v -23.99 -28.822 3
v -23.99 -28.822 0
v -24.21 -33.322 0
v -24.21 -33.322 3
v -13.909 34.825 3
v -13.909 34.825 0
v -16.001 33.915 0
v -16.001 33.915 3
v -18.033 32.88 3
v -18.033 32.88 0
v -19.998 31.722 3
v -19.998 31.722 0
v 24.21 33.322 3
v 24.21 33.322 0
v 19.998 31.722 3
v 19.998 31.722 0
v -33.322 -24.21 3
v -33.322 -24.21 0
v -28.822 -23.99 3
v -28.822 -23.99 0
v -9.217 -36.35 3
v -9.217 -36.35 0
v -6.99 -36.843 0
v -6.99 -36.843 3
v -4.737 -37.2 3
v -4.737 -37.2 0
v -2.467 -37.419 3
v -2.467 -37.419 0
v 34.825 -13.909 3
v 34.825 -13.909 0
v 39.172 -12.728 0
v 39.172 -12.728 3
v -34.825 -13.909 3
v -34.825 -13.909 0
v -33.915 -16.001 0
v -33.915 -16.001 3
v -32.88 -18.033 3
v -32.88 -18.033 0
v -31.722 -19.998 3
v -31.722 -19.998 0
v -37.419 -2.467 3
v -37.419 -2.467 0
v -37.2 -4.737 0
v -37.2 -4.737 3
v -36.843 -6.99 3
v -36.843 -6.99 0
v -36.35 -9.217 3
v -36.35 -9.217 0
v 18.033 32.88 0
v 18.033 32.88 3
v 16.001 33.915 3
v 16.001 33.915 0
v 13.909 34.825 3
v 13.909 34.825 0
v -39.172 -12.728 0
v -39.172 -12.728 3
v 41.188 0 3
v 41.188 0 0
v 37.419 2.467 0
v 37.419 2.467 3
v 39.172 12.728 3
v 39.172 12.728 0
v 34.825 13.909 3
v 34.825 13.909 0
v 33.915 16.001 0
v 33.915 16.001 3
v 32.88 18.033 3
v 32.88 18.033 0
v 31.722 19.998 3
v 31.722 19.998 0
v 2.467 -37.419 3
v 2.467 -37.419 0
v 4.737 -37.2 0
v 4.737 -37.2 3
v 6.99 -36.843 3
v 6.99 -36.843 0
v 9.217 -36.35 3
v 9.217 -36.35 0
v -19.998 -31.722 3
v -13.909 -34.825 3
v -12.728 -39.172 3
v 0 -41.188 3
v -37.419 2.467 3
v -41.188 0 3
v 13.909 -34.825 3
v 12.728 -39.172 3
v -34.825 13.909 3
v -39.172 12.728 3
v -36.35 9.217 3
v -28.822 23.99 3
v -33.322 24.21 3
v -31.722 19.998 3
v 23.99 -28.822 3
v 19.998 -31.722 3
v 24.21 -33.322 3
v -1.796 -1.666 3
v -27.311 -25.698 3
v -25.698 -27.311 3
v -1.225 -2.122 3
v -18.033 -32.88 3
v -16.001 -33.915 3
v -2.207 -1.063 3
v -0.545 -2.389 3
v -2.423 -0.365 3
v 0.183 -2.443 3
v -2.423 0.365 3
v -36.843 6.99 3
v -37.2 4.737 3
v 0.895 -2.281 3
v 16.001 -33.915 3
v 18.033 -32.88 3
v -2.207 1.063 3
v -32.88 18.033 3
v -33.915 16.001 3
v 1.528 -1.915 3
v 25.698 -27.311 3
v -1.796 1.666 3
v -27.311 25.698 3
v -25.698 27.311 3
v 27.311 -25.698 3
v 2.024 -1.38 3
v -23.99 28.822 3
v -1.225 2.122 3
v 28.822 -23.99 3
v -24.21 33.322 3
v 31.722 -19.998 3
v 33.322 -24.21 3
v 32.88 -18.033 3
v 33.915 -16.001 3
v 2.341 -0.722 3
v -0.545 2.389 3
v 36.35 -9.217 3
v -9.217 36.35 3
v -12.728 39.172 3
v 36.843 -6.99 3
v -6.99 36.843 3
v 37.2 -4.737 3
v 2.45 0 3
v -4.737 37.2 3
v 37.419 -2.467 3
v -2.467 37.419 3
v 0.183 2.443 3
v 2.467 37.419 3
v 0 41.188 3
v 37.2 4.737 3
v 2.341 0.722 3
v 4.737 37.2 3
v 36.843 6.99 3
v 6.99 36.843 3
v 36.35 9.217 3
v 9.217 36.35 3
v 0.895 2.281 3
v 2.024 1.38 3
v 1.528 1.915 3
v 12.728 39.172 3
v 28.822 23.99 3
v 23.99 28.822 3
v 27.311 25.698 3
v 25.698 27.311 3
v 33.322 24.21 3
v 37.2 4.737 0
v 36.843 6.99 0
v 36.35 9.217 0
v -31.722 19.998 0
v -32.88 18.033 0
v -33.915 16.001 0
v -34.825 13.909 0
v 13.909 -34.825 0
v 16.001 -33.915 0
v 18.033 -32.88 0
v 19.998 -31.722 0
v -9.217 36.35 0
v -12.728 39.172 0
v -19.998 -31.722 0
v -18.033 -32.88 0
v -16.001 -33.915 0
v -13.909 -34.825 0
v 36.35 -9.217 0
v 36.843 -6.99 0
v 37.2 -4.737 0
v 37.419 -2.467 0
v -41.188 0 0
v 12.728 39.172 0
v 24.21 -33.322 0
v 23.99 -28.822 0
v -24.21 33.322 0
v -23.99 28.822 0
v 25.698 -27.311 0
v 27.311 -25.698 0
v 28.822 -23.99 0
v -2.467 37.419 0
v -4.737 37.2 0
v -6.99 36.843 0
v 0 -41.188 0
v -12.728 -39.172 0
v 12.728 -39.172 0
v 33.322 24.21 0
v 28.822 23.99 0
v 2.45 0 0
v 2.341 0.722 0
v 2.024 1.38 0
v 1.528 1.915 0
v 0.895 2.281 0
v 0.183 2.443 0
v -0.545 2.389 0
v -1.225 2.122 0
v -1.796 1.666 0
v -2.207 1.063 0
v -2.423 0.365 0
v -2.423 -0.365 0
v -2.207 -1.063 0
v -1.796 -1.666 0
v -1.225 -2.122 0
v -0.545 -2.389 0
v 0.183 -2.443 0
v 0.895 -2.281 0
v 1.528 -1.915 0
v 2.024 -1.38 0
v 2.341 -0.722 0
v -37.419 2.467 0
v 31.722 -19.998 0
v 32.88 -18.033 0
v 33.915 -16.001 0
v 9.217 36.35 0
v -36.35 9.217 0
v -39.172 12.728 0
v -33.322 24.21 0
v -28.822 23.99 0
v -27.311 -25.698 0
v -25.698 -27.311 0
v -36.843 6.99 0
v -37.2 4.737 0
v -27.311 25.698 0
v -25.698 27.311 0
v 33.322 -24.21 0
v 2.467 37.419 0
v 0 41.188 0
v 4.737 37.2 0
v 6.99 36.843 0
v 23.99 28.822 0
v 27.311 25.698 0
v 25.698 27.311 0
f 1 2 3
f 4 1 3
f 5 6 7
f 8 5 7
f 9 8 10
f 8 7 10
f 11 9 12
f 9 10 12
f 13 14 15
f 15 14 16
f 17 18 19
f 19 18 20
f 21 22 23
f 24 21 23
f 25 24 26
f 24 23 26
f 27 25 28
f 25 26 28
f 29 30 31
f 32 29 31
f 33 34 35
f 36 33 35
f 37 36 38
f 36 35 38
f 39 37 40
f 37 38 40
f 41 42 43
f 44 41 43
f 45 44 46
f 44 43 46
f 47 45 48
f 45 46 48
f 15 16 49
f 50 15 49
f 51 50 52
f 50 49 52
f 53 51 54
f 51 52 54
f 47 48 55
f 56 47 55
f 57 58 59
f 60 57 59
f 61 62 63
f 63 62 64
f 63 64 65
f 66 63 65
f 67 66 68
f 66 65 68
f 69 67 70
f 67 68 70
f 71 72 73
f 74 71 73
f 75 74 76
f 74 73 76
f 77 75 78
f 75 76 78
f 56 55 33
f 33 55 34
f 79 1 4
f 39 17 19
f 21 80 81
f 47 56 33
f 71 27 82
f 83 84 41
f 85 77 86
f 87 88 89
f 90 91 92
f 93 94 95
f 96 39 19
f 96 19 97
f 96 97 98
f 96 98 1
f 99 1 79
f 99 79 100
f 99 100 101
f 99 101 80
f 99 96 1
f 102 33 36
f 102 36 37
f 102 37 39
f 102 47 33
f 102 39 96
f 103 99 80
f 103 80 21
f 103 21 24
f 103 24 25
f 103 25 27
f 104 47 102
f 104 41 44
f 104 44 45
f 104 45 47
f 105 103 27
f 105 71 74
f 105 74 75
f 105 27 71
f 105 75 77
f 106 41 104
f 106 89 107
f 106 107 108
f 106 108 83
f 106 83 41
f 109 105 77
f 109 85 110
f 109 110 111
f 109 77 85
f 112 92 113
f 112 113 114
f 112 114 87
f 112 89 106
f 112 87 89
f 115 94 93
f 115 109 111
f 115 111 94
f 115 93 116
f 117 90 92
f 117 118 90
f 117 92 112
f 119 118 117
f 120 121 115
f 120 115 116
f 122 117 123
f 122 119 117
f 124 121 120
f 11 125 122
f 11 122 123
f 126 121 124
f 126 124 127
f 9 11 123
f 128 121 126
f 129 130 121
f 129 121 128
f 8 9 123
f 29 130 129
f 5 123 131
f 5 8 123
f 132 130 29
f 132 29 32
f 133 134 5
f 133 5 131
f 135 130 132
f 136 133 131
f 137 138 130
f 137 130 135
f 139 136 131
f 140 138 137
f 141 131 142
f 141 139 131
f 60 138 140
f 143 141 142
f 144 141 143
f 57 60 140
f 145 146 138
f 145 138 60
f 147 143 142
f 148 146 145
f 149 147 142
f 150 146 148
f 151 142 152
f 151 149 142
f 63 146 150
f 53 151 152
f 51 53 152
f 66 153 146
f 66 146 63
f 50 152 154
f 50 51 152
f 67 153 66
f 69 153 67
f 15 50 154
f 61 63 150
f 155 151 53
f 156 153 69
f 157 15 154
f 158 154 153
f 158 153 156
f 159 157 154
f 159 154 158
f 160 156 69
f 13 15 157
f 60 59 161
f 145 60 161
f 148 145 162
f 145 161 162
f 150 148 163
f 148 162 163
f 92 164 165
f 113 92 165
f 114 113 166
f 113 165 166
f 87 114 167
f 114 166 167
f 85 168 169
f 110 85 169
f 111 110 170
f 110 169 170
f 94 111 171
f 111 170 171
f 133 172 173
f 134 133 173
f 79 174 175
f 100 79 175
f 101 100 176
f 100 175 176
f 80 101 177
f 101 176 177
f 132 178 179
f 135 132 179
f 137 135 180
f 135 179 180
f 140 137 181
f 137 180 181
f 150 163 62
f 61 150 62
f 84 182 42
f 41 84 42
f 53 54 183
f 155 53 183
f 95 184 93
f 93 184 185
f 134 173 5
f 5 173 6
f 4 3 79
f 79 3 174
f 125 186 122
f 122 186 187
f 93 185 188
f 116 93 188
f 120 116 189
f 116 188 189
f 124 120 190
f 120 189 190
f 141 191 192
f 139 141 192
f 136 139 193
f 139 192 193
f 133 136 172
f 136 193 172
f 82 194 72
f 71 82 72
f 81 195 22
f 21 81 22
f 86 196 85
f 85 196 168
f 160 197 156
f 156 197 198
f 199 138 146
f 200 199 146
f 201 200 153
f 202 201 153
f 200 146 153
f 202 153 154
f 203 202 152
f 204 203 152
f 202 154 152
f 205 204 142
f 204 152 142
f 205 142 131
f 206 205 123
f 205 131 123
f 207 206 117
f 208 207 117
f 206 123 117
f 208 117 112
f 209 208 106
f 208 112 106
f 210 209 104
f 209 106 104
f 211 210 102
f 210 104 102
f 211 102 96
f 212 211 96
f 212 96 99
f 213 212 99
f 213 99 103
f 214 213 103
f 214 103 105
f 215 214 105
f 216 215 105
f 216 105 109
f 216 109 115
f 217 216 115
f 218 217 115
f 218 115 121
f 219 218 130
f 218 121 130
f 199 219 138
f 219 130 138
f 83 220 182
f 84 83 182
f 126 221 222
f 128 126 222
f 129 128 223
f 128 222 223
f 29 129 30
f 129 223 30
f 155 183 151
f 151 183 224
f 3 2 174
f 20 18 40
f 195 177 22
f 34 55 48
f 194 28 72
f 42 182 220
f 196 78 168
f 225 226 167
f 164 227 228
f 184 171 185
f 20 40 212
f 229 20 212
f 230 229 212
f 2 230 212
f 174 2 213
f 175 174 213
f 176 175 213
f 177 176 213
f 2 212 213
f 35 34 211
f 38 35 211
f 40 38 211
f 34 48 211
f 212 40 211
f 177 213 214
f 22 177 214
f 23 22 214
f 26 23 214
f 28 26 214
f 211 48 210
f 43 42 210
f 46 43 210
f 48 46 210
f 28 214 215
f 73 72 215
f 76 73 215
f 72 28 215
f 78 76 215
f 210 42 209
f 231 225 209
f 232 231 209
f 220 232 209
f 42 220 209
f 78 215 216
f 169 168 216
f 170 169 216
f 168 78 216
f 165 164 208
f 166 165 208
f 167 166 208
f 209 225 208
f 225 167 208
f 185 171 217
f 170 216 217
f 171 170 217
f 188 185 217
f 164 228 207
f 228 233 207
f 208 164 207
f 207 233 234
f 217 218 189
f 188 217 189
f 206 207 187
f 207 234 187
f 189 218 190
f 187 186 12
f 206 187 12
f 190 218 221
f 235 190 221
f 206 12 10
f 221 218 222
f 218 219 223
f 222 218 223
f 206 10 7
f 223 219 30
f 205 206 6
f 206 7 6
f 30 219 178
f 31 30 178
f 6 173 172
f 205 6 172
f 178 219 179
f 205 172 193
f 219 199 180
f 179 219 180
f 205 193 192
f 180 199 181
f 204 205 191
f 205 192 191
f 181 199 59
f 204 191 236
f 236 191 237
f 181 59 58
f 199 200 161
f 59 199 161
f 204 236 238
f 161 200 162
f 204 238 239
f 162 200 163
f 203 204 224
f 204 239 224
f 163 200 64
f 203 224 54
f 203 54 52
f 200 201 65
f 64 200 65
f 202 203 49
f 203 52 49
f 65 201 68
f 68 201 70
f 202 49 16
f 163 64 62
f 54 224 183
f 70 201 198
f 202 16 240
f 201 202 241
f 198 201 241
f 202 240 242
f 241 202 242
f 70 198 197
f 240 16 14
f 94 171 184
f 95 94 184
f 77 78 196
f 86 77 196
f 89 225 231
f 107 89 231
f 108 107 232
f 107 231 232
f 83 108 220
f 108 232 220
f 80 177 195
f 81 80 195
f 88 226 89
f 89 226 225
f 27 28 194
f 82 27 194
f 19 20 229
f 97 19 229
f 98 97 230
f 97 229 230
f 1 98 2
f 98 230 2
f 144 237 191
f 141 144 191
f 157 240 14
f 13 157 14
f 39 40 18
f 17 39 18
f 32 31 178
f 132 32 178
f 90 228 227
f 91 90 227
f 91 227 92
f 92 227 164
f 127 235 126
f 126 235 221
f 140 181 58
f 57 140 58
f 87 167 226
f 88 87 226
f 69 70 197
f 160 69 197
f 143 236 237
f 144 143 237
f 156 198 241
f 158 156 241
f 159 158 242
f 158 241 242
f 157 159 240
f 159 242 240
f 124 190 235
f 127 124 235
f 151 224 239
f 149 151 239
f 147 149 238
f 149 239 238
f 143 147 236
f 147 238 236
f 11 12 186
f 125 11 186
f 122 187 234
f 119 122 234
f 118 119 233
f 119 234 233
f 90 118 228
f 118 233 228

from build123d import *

# Parameters (mm, degrees)
F1_DEPTH = 3
F2_R     = 2.45
F3_DEPTH = 3


with BuildPart() as f1:
    # F0 (on Top) → F1 (new body)
    with BuildSketch(Plane.XY):
        with BuildLine():
            ThreePointArc((37.418773, -2.466863), (37.479688, -1.2341), (37.5, 0))
            ThreePointArc((37.5, 0), (37.479688, 1.2341), (37.418773, 2.466863))
            ThreePointArc((37.418773, 2.466863), (37.038313, 5.866292), (36.349671, 9.21691))
            ThreePointArc((36.349671, 9.21691), (35.664619, 11.588137), (34.825065, 13.909163))
            ThreePointArc((34.825065, 13.909163), (33.412745, 17.024644), (31.722409, 19.998469))
            ThreePointArc((31.722409, 19.998469), (30.338137, 22.041947), (28.822438, 23.989937))
            ThreePointArc((28.822438, 23.989937), (26.516504, 26.516504), (23.989937, 28.822438))
            ThreePointArc((23.989937, 28.822438), (22.041947, 30.338137), (19.998469, 31.722409))
            ThreePointArc((19.998469, 31.722409), (17.024644, 33.412745), (13.909163, 34.825065))
            ThreePointArc((13.909163, 34.825065), (11.588137, 35.664619), (9.21691, 36.349671))
            ThreePointArc((9.21691, 36.349671), (5.866292, 37.038313), (2.466863, 37.418773))
            ThreePointArc((2.466863, 37.418773), (0, 37.5), (-2.466863, 37.418773))
            ThreePointArc((-2.466863, 37.418773), (-5.866292, 37.038313), (-9.21691, 36.349671))
            ThreePointArc((-9.21691, 36.349671), (-11.588137, 35.664619), (-13.909163, 34.825065))
            ThreePointArc((-13.909163, 34.825065), (-17.024644, 33.412745), (-19.998469, 31.722409))
            ThreePointArc((-19.998469, 31.722409), (-22.041947, 30.338137), (-23.989937, 28.822438))
            ThreePointArc((-23.989937, 28.822438), (-26.516504, 26.516504), (-28.822438, 23.989937))
            ThreePointArc((-28.822438, 23.989937), (-30.338137, 22.041947), (-31.722409, 19.998469))
            ThreePointArc((-31.722409, 19.998469), (-33.412745, 17.024644), (-34.825065, 13.909163))
            ThreePointArc((-34.825065, 13.909163), (-35.664619, 11.588137), (-36.349671, 9.21691))
            ThreePointArc((-36.349671, 9.21691), (-37.038313, 5.866292), (-37.418773, 2.466863))
            ThreePointArc((-37.418773, 2.466863), (-37.5, 0), (-37.418773, -2.466863))
            ThreePointArc((-37.418773, -2.466863), (-37.038313, -5.866292), (-36.349671, -9.21691))
            ThreePointArc((-36.349671, -9.21691), (-35.664619, -11.588137), (-34.825065, -13.909163))
            ThreePointArc((-34.825065, -13.909163), (-33.412745, -17.024644), (-31.722409, -19.998469))
            ThreePointArc((-31.722409, -19.998469), (-30.338137, -22.041947), (-28.822438, -23.989937))
            ThreePointArc((-28.822438, -23.989937), (-26.516504, -26.516504), (-23.989937, -28.822438))
            ThreePointArc((-23.989937, -28.822438), (-22.041947, -30.338137), (-19.998469, -31.722409))
            ThreePointArc((-19.998469, -31.722409), (-17.024644, -33.412745), (-13.909163, -34.825065))
            ThreePointArc((-13.909163, -34.825065), (-11.588137, -35.664619), (-9.21691, -36.349671))
            ThreePointArc((-9.21691, -36.349671), (-5.866292, -37.038313), (-2.466863, -37.418773))
            ThreePointArc((-2.466863, -37.418773), (0, -37.5), (2.466863, -37.418773))
            ThreePointArc((2.466863, -37.418773), (5.866292, -37.038313), (9.21691, -36.349671))
            ThreePointArc((9.21691, -36.349671), (11.588137, -35.664619), (13.909163, -34.825065))
            ThreePointArc((13.909163, -34.825065), (17.024644, -33.412745), (19.998469, -31.722409))
            ThreePointArc((19.998469, -31.722409), (22.041947, -30.338137), (23.989937, -28.822438))
            ThreePointArc((23.989937, -28.822438), (26.516504, -26.516504), (28.822438, -23.989937))
            ThreePointArc((28.822438, -23.989937), (30.338137, -22.041947), (31.722409, -19.998469))
            ThreePointArc((31.722409, -19.998469), (33.412745, -17.024644), (34.825065, -13.909163))
            ThreePointArc((34.825065, -13.909163), (35.664619, -11.588137), (36.349671, -9.21691))
            ThreePointArc((36.349671, -9.21691), (37.038313, -5.866292), (37.418773, -2.466863))
        make_face()
        with BuildLine():
            ThreePointArc((37.418773, 2.466863), (37.479688, 1.2341), (37.5, 0))
            ThreePointArc((37.5, 0), (37.479688, -1.2341), (37.418773, -2.466863))
            Line((37.418773, -2.466863), (41.188397, 0))
            Line((41.188397, 0), (37.418773, 2.466863))
        make_face()
        with BuildLine():
            ThreePointArc((34.825065, 13.909163), (35.664619, 11.588137), (36.349671, 9.21691))
            Line((36.349671, 9.21691), (39.172493, 12.727915))
            Line((39.172493, 12.727915), (34.825065, 13.909163))
        make_face()
        with BuildLine():
            Line((39.172493, -12.727915), (36.349671, -9.21691))
            ThreePointArc((36.349671, -9.21691), (35.664619, -11.588137), (34.825065, -13.909163))
            Line((34.825065, -13.909163), (39.172493, -12.727915))
        make_face()
        with BuildLine():
            ThreePointArc((28.822438, 23.989937), (30.338137, 22.041947), (31.722409, 19.998469))
            Line((31.722409, 19.998469), (33.322113, 24.209932))
            Line((33.322113, 24.209932), (28.822438, 23.989937))
        make_face()
        with BuildLine():
            Line((33.322113, -24.209932), (31.722409, -19.998469))
            ThreePointArc((31.722409, -19.998469), (30.338137, -22.041947), (28.822438, -23.989937))
            Line((28.822438, -23.989937), (33.322113, -24.209932))
        make_face()
        with BuildLine():
            ThreePointArc((19.998469, 31.722409), (22.041947, 30.338137), (23.989937, 28.822438))
            Line((23.989937, 28.822438), (24.209932, 33.322113))
            Line((24.209932, 33.322113), (19.998469, 31.722409))
        make_face()
        with BuildLine():
            Line((24.209932, -33.322113), (23.989937, -28.822438))
            ThreePointArc((23.989937, -28.822438), (22.041947, -30.338137), (19.998469, -31.722409))
            Line((19.998469, -31.722409), (24.209932, -33.322113))
        make_face()
        with BuildLine():
            ThreePointArc((9.21691, 36.349671), (11.588137, 35.664619), (13.909163, 34.825065))
            Line((13.909163, 34.825065), (12.727915, 39.172493))
            Line((12.727915, 39.172493), (9.21691, 36.349671))
        make_face()
        with BuildLine():
            Line((12.727915, -39.172493), (13.909163, -34.825065))
            ThreePointArc((13.909163, -34.825065), (11.588137, -35.664619), (9.21691, -36.349671))
            Line((9.21691, -36.349671), (12.727915, -39.172493))
        make_face()
        with BuildLine():
            ThreePointArc((-2.466863, 37.418773), (0, 37.5), (2.466863, 37.418773))
            Line((2.466863, 37.418773), (0, 41.188397))
            Line((0, 41.188397), (-2.466863, 37.418773))
        make_face()
        with BuildLine():
            Line((0, -41.188397), (2.466863, -37.418773))
            ThreePointArc((2.466863, -37.418773), (0, -37.5), (-2.466863, -37.418773))
            Line((-2.466863, -37.418773), (0, -41.188397))
        make_face()
        with BuildLine():
            ThreePointArc((-13.909163, 34.825065), (-11.588137, 35.664619), (-9.21691, 36.349671))
            Line((-9.21691, 36.349671), (-12.727915, 39.172493))
            Line((-12.727915, 39.172493), (-13.909163, 34.825065))
        make_face()
        with BuildLine():
            Line((-12.727915, -39.172493), (-9.21691, -36.349671))
            ThreePointArc((-9.21691, -36.349671), (-11.588137, -35.664619), (-13.909163, -34.825065))
            Line((-13.909163, -34.825065), (-12.727915, -39.172493))
        make_face()
        with BuildLine():
            ThreePointArc((-23.989937, 28.822438), (-22.041947, 30.338137), (-19.998469, 31.722409))
            Line((-19.998469, 31.722409), (-24.209932, 33.322113))
            Line((-24.209932, 33.322113), (-23.989937, 28.822438))
        make_face()
        with BuildLine():
            Line((-24.209932, -33.322113), (-19.998469, -31.722409))
            ThreePointArc((-19.998469, -31.722409), (-22.041947, -30.338137), (-23.989937, -28.822438))
            Line((-23.989937, -28.822438), (-24.209932, -33.322113))
        make_face()
        with BuildLine():
            ThreePointArc((-31.722409, 19.998469), (-30.338137, 22.041947), (-28.822438, 23.989937))
            Line((-28.822438, 23.989937), (-33.322113, 24.209932))
            Line((-33.322113, 24.209932), (-31.722409, 19.998469))
        make_face()
        with BuildLine():
            Line((-33.322113, -24.209932), (-28.822438, -23.989937))
            ThreePointArc((-28.822438, -23.989937), (-30.338137, -22.041947), (-31.722409, -19.998469))
            Line((-31.722409, -19.998469), (-33.322113, -24.209932))
        make_face()
        with BuildLine():
            ThreePointArc((-36.349671, 9.21691), (-35.664619, 11.588137), (-34.825065, 13.909163))
            Line((-34.825065, 13.909163), (-39.172493, 12.727915))
            Line((-39.172493, 12.727915), (-36.349671, 9.21691))
        make_face()
        with BuildLine():
            Line((-39.172493, -12.727915), (-34.825065, -13.909163))
            ThreePointArc((-34.825065, -13.909163), (-35.664619, -11.588137), (-36.349671, -9.21691))
            Line((-36.349671, -9.21691), (-39.172493, -12.727915))
        make_face()
        with BuildLine():
            ThreePointArc((-37.418773, -2.466863), (-37.5, 0), (-37.418773, 2.466863))
            Line((-37.418773, 2.466863), (-41.188397, 0))
            Line((-41.188397, 0), (-37.418773, -2.466863))
        make_face()
    extrude(amount=F1_DEPTH)

    # F2 (on face) → F3 (cut)
    with BuildSketch(Plane.XY.offset(3)):
        Circle(F2_R)
    extrude(amount=-F3_DEPTH, mode=Mode.SUBTRACT)


solid = f1.part
